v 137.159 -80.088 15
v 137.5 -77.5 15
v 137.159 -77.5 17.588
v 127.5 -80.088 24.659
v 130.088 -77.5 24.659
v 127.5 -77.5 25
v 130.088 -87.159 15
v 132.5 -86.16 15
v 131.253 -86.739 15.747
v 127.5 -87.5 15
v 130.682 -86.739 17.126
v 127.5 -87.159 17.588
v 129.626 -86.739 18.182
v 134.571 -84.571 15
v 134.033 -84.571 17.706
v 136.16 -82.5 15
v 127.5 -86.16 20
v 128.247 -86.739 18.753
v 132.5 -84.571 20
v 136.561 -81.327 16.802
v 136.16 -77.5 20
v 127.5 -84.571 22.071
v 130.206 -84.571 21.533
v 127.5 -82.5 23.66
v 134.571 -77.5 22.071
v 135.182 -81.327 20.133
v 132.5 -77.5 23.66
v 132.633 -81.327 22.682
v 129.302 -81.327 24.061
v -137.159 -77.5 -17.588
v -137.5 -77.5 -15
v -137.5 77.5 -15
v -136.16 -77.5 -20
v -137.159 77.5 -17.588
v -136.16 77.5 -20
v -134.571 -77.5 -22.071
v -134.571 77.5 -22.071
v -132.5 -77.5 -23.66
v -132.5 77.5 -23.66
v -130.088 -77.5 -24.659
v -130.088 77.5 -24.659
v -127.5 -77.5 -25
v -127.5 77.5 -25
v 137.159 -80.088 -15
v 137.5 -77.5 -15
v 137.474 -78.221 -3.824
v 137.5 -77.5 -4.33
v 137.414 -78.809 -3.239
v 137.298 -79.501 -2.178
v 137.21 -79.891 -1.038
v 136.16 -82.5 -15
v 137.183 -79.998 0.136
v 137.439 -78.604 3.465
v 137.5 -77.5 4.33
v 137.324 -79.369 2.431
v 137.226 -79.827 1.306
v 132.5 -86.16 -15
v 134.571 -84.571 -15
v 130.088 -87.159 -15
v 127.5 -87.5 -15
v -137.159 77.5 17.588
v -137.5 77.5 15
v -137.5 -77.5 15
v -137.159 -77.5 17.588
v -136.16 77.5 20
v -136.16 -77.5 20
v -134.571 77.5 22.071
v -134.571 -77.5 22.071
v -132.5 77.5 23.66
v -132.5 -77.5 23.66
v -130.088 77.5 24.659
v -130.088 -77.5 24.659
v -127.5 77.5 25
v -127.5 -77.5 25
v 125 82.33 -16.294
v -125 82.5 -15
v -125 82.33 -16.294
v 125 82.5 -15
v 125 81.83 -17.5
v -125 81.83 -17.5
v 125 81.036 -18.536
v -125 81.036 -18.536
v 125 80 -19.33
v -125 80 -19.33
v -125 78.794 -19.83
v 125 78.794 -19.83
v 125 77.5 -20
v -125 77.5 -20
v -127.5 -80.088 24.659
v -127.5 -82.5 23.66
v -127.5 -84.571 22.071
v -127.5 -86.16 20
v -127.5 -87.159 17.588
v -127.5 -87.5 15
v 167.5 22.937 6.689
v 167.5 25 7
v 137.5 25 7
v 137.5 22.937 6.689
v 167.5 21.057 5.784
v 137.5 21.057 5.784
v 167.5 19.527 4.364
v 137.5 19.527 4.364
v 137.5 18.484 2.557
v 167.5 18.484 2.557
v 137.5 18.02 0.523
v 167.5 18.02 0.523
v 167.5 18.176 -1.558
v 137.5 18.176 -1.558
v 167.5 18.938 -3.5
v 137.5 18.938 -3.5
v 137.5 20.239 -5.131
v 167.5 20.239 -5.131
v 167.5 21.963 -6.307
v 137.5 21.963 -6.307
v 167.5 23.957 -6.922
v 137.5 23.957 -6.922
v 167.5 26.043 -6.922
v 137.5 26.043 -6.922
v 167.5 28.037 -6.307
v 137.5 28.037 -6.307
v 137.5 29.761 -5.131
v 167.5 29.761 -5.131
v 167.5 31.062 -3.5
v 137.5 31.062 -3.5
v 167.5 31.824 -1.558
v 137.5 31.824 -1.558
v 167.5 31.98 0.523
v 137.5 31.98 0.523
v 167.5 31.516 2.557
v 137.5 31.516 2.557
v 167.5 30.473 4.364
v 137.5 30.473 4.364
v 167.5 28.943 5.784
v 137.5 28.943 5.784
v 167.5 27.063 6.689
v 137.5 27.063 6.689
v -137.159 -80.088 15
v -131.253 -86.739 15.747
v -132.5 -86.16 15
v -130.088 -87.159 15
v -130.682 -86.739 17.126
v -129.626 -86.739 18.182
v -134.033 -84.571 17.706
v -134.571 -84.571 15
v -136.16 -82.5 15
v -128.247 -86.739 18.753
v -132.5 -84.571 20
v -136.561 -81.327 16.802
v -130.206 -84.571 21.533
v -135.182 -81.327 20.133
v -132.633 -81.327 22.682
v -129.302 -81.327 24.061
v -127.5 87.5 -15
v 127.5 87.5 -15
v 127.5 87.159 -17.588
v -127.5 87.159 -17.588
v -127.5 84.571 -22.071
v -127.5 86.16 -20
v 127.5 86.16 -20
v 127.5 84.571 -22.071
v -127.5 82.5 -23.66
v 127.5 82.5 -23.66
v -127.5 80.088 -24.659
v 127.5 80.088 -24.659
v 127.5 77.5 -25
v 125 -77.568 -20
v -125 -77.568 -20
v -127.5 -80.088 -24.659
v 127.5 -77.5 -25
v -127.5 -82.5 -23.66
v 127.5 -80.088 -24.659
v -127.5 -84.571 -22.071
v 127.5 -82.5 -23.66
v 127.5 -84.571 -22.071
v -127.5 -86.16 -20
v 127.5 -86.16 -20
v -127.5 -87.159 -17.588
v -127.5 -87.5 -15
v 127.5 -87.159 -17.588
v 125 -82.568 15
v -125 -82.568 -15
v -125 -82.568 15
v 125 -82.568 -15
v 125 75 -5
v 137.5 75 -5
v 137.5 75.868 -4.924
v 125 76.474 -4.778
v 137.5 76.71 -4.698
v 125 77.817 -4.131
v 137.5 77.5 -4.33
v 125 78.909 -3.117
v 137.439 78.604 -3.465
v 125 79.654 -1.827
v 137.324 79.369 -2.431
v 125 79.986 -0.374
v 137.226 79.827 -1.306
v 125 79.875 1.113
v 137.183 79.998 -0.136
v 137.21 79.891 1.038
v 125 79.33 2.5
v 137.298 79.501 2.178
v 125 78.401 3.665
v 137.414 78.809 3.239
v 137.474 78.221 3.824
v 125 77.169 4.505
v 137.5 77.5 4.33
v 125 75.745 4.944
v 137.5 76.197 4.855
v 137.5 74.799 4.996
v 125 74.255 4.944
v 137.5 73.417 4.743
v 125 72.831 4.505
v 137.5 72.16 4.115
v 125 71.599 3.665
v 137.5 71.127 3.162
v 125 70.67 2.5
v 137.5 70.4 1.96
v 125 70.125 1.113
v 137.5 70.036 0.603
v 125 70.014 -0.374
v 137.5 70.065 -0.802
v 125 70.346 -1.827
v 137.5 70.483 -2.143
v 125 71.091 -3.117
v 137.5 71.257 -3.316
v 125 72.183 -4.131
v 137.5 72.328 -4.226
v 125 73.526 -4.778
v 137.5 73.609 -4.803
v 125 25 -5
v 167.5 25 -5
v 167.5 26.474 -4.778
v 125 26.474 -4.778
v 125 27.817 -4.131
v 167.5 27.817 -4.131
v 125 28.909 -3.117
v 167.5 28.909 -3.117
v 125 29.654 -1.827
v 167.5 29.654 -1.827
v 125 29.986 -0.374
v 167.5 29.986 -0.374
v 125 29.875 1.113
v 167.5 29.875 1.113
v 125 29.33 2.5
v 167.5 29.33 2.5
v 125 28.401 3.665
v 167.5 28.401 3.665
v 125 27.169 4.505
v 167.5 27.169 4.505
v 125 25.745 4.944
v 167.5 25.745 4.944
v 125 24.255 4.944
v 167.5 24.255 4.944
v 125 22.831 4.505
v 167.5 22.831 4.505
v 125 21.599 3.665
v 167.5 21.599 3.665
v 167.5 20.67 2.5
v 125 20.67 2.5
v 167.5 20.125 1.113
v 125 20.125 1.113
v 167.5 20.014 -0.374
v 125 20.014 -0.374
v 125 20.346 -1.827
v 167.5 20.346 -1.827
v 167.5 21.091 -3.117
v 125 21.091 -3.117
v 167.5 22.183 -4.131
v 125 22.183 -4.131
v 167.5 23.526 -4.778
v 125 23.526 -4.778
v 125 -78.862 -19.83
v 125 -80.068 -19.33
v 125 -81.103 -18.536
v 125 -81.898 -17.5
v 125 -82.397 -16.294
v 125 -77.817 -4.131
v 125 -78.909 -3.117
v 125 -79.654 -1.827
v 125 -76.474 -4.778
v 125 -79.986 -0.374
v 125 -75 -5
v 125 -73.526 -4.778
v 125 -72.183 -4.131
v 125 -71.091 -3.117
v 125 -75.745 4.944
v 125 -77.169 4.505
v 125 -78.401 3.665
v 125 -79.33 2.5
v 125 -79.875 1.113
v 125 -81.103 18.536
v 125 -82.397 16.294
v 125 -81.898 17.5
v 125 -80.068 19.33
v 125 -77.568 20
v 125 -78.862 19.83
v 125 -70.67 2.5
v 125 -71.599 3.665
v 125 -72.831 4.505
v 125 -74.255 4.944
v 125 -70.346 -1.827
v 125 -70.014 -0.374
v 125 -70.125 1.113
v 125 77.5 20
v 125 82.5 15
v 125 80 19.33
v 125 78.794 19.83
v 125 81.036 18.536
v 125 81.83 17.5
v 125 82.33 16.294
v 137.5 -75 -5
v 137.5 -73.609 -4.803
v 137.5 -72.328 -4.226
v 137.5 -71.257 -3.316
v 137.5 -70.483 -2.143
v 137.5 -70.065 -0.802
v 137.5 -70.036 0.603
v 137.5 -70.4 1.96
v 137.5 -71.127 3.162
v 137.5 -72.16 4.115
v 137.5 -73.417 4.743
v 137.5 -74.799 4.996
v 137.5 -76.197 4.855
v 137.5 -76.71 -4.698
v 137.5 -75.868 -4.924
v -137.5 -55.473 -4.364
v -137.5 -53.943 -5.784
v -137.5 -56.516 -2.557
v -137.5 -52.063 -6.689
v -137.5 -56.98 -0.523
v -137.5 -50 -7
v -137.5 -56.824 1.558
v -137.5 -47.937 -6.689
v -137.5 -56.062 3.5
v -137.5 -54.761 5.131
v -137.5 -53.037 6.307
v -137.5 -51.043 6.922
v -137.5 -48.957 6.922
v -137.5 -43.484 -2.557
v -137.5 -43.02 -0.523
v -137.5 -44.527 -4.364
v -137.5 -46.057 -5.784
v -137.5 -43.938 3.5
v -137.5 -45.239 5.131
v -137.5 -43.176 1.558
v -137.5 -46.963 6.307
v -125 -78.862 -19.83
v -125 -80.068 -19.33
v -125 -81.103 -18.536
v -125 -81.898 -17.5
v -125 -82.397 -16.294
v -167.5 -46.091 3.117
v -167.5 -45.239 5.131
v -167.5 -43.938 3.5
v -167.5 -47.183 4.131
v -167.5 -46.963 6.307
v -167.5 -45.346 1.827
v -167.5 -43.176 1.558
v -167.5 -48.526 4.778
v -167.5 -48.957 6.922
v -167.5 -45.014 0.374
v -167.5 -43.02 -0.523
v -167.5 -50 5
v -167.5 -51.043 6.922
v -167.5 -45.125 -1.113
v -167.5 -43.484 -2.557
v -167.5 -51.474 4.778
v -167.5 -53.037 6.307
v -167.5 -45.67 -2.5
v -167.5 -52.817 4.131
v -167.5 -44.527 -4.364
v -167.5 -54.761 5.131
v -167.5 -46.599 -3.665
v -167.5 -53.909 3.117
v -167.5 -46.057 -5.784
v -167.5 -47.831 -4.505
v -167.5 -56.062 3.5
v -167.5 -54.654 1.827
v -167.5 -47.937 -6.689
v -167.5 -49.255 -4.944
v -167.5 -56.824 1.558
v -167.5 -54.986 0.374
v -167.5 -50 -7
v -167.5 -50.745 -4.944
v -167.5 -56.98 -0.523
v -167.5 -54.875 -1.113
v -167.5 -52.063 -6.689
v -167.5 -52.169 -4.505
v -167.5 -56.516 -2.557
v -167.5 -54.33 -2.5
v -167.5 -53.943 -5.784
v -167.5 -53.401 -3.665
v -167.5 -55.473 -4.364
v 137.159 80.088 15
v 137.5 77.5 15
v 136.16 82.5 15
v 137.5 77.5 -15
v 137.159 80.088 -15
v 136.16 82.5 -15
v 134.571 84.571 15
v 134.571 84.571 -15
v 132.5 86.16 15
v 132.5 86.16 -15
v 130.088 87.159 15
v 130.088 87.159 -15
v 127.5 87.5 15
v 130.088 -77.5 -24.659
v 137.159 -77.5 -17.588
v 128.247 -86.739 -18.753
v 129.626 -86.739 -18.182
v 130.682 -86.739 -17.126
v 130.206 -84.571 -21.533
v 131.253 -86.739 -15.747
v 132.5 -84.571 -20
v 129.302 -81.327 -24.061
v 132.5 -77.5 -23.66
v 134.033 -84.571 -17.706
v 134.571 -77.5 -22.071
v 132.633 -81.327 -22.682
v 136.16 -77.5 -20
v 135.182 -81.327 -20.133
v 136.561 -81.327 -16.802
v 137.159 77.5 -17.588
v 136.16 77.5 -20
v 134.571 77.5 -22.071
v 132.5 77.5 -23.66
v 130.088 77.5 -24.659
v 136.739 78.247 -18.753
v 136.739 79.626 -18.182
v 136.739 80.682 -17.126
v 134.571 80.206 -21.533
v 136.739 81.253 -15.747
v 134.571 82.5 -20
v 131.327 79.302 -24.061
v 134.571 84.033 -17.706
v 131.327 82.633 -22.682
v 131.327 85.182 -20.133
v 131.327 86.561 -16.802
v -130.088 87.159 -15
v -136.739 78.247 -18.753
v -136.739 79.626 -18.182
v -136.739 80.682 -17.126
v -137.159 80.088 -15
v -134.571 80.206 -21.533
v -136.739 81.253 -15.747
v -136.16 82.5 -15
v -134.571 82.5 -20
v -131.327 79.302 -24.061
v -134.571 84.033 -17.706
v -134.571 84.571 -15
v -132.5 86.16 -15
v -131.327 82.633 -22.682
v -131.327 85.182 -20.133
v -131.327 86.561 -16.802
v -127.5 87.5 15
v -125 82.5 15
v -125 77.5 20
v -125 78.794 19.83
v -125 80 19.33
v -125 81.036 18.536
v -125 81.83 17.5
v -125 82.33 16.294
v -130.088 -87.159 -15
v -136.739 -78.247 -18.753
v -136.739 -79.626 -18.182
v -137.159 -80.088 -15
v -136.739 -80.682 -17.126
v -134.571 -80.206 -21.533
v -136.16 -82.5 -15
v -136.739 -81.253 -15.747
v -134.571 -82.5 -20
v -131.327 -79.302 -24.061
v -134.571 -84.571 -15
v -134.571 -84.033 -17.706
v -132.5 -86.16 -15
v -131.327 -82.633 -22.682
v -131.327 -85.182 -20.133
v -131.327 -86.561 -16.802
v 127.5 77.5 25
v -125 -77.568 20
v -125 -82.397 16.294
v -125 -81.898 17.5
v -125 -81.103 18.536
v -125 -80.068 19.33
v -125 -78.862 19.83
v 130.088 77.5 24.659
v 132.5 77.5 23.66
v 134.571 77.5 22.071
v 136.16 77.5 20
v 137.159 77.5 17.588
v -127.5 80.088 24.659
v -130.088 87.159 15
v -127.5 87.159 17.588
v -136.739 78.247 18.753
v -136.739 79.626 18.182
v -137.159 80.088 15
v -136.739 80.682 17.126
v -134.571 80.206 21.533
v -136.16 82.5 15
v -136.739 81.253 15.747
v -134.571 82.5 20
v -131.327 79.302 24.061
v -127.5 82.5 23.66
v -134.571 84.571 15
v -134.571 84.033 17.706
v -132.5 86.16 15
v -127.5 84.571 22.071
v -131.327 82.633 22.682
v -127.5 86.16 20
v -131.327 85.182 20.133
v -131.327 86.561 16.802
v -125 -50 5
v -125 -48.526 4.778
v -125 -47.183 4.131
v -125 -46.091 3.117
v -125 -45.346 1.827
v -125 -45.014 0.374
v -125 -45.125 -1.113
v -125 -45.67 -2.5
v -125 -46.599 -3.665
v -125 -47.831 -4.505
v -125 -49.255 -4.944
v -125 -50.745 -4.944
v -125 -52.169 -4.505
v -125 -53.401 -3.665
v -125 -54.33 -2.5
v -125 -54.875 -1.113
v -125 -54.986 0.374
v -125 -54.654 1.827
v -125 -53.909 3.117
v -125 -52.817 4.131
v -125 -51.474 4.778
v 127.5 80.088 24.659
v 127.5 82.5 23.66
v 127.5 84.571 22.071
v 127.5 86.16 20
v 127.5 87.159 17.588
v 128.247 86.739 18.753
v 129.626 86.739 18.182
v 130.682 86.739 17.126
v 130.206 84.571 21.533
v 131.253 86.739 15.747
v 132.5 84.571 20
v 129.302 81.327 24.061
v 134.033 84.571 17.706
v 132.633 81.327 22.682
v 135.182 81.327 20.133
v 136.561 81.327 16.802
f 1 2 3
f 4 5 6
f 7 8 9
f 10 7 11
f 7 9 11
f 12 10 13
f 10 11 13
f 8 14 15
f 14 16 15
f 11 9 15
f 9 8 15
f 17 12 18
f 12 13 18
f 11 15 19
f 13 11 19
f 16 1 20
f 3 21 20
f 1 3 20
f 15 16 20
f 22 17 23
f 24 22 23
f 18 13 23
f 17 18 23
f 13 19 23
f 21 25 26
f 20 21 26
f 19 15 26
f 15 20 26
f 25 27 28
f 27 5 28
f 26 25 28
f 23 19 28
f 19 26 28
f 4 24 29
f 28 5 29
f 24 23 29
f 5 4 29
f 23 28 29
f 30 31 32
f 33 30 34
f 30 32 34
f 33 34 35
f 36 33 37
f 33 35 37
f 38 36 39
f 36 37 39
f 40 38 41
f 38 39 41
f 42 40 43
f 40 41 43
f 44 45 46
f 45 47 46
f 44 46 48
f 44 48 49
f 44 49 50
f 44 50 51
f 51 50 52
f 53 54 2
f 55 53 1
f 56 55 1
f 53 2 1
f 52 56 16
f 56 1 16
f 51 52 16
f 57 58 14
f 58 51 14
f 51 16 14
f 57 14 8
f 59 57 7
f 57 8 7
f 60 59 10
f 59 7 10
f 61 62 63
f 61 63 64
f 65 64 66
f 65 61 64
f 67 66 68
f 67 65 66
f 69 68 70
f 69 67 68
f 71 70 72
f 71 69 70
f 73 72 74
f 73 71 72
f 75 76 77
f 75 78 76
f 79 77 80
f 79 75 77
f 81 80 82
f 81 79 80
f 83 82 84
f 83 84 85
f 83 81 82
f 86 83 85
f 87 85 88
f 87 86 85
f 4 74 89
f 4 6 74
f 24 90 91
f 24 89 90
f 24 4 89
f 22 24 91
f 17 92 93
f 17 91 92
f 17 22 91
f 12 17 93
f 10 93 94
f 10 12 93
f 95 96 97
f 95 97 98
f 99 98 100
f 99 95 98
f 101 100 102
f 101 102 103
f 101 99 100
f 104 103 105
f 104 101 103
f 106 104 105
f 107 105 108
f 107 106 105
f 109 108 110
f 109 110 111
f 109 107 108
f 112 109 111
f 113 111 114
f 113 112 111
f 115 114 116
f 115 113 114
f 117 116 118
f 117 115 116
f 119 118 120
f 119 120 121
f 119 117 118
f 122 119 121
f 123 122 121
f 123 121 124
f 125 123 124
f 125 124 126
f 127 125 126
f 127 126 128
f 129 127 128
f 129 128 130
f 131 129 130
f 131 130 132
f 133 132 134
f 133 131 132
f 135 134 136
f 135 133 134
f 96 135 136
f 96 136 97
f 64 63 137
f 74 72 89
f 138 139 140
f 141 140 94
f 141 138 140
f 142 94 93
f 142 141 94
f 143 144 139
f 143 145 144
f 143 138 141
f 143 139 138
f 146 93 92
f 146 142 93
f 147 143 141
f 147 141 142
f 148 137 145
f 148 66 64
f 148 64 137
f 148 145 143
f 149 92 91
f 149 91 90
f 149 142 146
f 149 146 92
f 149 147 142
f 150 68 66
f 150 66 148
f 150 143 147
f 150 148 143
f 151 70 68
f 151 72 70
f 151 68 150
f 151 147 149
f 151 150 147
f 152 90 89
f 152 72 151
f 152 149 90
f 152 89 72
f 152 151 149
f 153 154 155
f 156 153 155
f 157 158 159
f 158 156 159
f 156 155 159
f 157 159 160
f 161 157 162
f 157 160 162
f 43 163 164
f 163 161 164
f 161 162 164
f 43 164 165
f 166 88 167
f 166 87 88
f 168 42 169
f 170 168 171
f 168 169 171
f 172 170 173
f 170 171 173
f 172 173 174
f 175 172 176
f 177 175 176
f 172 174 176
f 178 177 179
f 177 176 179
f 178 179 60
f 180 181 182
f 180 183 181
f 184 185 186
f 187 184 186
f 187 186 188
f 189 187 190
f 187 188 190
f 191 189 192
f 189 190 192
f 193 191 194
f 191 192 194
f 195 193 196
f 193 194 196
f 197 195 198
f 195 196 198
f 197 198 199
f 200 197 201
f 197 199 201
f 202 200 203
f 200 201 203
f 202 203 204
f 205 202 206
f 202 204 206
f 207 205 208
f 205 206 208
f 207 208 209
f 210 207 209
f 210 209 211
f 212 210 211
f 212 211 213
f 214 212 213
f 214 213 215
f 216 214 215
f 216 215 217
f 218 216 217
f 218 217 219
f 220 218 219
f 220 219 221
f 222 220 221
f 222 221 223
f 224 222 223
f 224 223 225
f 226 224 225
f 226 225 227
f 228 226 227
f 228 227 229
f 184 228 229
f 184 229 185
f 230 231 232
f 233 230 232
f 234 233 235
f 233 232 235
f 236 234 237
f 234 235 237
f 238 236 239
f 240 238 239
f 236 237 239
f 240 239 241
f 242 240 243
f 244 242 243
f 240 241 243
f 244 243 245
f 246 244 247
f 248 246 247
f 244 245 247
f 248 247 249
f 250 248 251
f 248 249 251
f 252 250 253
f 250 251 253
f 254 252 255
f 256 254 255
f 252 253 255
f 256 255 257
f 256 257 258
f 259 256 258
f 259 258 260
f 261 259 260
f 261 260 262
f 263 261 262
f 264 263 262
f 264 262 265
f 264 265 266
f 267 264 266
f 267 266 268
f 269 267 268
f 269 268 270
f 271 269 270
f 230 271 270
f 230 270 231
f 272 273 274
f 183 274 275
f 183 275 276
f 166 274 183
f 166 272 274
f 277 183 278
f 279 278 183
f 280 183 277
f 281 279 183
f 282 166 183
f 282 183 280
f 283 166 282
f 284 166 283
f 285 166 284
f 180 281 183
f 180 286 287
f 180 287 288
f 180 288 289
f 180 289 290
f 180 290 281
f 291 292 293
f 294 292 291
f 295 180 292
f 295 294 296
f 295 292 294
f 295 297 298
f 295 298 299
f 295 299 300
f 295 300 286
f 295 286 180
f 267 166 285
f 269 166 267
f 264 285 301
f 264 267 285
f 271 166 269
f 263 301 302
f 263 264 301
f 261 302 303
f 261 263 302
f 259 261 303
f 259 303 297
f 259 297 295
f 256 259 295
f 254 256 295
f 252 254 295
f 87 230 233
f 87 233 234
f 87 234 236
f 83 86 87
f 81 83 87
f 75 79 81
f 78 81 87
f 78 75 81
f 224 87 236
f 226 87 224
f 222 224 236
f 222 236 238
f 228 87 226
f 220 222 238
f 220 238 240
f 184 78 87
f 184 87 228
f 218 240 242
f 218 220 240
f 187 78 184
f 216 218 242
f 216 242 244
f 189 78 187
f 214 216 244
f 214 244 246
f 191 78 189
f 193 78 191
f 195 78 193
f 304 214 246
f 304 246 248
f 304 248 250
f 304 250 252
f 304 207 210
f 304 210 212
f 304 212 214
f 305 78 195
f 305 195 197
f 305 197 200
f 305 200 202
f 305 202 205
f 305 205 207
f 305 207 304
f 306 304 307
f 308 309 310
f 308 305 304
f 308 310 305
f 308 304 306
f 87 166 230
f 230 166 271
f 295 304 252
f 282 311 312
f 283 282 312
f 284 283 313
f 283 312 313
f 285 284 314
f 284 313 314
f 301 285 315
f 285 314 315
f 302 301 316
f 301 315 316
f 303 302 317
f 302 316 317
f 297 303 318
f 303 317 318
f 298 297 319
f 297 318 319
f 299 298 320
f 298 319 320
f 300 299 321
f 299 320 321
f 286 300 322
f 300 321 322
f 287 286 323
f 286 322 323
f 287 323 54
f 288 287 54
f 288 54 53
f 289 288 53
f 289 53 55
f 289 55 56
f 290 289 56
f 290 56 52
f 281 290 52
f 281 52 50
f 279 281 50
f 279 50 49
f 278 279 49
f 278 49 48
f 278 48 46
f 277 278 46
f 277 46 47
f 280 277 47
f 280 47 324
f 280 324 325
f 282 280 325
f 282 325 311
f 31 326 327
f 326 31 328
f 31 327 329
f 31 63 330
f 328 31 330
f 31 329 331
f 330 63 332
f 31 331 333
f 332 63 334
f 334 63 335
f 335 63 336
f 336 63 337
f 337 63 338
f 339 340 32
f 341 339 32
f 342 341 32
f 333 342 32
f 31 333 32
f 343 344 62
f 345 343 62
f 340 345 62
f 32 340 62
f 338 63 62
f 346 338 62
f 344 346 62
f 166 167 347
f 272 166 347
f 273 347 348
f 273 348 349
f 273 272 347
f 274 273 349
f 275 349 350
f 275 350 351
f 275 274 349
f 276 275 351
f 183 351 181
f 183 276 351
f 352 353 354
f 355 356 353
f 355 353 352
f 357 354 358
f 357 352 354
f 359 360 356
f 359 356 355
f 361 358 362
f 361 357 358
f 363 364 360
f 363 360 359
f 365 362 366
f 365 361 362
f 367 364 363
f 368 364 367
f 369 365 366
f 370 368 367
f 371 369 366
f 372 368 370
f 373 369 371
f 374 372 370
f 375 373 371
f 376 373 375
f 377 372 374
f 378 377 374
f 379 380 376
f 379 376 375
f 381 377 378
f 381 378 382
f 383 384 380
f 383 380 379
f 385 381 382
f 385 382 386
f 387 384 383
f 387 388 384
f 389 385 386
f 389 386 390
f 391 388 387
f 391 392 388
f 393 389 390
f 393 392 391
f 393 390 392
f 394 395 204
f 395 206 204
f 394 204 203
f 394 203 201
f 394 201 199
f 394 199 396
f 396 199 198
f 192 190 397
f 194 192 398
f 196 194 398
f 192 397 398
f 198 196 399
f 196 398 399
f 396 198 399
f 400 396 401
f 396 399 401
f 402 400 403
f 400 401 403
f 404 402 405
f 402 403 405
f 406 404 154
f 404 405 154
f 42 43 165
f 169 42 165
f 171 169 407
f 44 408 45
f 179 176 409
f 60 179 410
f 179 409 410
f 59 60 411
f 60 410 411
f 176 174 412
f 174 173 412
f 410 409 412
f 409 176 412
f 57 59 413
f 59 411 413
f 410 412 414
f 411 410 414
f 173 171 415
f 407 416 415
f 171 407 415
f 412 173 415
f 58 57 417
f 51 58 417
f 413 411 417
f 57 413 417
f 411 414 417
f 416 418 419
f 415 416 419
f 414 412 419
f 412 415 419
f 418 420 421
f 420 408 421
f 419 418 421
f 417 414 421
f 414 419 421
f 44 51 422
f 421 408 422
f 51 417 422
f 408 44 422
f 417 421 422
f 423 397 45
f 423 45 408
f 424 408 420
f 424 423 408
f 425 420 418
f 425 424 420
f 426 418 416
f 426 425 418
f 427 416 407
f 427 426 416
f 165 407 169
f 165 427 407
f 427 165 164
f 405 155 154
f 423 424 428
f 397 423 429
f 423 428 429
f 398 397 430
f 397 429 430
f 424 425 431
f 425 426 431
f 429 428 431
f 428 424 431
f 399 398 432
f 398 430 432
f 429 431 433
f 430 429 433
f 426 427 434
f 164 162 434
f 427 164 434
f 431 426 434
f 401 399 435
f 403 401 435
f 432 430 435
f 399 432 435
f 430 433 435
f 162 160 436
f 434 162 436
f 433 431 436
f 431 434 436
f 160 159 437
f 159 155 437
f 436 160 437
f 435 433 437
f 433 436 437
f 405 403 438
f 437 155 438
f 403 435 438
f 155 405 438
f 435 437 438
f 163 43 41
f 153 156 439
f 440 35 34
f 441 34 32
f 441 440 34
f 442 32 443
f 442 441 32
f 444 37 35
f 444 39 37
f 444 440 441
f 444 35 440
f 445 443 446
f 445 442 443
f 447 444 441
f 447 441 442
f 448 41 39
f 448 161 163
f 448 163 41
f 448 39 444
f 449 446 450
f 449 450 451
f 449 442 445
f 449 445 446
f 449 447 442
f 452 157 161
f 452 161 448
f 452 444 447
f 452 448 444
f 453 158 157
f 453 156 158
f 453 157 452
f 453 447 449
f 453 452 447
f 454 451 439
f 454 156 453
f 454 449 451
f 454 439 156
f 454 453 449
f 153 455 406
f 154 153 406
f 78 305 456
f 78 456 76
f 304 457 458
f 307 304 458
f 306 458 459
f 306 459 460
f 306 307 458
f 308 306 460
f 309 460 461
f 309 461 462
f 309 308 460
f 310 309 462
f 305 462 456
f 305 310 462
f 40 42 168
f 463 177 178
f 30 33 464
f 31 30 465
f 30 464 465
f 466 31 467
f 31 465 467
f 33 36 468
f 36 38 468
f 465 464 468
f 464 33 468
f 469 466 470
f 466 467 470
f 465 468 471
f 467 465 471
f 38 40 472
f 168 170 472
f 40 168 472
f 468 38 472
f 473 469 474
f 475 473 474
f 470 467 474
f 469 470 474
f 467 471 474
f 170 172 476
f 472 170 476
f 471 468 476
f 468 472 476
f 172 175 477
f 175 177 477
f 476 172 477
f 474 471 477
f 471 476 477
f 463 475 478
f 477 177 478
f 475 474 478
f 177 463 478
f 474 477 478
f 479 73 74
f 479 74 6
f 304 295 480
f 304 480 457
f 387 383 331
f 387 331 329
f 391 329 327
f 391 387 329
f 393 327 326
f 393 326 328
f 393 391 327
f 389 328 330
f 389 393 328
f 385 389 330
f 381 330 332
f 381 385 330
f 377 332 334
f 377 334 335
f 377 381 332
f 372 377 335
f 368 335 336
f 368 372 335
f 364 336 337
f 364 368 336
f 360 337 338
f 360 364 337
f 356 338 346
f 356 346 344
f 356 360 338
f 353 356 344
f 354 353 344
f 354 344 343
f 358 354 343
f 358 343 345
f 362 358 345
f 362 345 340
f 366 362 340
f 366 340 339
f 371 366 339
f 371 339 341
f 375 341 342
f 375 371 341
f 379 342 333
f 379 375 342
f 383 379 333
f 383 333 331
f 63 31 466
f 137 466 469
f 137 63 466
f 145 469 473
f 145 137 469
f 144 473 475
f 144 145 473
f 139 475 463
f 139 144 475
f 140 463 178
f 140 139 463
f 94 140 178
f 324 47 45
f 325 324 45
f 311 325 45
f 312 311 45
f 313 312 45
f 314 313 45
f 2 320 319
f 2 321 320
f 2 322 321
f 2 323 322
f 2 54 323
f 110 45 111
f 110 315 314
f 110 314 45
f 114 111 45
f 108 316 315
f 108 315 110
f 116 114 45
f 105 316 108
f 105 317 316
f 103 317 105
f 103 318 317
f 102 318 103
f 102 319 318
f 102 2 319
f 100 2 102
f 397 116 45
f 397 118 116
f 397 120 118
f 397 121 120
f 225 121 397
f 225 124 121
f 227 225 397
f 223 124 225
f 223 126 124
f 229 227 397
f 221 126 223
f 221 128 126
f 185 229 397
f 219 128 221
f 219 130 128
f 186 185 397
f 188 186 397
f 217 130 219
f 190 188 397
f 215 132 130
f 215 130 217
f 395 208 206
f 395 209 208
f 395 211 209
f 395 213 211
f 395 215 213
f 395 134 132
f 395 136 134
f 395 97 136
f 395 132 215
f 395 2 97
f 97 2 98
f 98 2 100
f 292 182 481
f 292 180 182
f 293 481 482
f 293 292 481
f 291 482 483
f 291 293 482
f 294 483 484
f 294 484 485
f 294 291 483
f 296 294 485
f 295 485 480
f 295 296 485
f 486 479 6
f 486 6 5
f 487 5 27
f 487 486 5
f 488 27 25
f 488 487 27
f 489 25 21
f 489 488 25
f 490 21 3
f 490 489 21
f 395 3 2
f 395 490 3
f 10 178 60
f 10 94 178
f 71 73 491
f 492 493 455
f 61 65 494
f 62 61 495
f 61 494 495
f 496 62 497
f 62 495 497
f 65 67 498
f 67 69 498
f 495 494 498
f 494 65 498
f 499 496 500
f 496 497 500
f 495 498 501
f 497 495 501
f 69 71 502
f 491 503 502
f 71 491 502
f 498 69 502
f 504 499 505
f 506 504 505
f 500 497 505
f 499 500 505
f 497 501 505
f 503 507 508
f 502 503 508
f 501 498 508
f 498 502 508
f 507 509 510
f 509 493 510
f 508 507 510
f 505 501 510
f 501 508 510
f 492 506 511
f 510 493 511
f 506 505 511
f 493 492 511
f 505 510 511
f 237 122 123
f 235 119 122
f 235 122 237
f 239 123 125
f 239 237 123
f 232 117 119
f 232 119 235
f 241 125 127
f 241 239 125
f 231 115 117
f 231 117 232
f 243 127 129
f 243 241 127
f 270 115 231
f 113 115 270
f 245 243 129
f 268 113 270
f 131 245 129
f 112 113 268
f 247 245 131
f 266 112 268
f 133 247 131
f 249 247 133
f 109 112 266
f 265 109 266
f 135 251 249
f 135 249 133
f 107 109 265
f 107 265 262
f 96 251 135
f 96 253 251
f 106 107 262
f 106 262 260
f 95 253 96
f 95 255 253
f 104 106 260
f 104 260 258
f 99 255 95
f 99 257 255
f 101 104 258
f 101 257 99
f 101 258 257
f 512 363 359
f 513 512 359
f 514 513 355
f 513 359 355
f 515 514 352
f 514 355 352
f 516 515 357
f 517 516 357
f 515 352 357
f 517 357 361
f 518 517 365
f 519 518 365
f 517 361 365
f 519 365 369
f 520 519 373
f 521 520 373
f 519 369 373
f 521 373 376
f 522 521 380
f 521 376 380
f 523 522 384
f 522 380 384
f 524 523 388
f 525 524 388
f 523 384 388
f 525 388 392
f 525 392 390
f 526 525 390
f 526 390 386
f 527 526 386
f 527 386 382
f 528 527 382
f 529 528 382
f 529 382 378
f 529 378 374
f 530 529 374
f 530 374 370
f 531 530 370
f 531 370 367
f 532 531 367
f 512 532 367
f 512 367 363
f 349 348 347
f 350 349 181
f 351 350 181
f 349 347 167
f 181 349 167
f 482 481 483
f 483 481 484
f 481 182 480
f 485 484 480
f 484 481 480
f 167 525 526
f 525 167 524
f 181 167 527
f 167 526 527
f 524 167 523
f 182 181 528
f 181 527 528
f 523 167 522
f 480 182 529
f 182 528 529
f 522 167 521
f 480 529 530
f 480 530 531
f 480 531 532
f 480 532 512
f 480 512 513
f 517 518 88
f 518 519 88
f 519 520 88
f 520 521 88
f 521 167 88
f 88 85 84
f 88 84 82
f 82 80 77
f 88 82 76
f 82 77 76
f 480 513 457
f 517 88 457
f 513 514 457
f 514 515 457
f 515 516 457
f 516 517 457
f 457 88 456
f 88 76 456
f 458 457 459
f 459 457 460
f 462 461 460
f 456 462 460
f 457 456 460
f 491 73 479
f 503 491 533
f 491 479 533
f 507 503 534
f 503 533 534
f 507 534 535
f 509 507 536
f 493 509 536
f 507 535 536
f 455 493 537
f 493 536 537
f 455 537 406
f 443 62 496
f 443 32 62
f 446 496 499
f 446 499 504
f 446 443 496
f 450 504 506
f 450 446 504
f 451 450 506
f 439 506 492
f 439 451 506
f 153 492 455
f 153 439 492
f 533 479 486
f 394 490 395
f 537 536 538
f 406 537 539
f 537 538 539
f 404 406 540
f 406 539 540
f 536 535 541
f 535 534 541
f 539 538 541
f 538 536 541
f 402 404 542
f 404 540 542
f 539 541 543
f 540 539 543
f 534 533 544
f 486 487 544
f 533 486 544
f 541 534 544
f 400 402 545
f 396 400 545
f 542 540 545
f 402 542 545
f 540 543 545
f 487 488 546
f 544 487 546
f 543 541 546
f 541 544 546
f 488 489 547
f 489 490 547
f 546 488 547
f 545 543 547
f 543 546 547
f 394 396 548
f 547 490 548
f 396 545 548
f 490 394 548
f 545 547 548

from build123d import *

# Parameters (mm, degrees)
SKETCH1_W           = 275
SKETCH1_H           = 175
BOSS_EXTRUDE1_DEPTH = 25
FILLET1_R           = 10
SKETCH2_R           = 5
CUT_EXTRUDE1_DEPTH  = 180
CUT_EXTRUDE2_DEPTH  = 125
SKETCH5_R           = 5
CUT_EXTRUDE3_DEPTH  = 190
BOSS_EXTRUDE2_START = 30
SKETCH6_R           = 7
SKETCH6_R_2         = 5
BOSS_EXTRUDE2_DEPTH = 30
BOSS_EXTRUDE3_START = 30
SKETCH7_R           = 7
SKETCH7_R_2         = 5
BOSS_EXTRUDE3_DEPTH = 30


with BuildPart() as part:
    # Sketch1 → Boss-Extrude1 (new, symmetric)
    with BuildSketch(Plane.XY):
        Rectangle(SKETCH1_W, SKETCH1_H)
    extrude(amount=BOSS_EXTRUDE1_DEPTH, both=True)

    # Fillet1
    fillet1_edges = [part.edges().sort_by_distance(p)[0] for p in [
        (137.5, 0, 25),
        (0, 87.5, 25),
        (-137.5, 0, 25),
        (0, 87.5, -25),
        (137.5, 0, -25),
        (0, -87.5, -25),
        (-137.5, 0, -25),
        (-137.5, 87.5, 0),
        (137.5, 87.5, 0),
        (137.5, -87.5, 0),
        (-137.5, -87.5, 0),
        (0, -87.5, 25),
    ]]
    fillet(fillet1_edges, radius=FILLET1_R)

    # Sketch2 → Cut-Extrude1 (cut)
    with BuildSketch(Plane(origin=(137.5, 0, 0), x_dir=(0, 0, -1), z_dir=(1, 0, 0))):
        with Locations((0, 75)):
            Circle(SKETCH2_R)
        with Locations((0, 25)):
            Circle(SKETCH2_R)
        with Locations((0, -75)):
            Circle(SKETCH2_R)
    extrude(amount=-CUT_EXTRUDE1_DEPTH, mode=Mode.SUBTRACT)

    # Sketch3 → Cut-Extrude2 (cut, symmetric)
    with BuildSketch(Plane(origin=(0, 0, 0), x_dir=(0, 0, -1), z_dir=(1, 0, 0))):
        with BuildLine():
            Line((-15, 82.5), (15, 82.5))
            ThreePointArc((15, 82.5), (18.535533906, 81.035533906), (20, 77.5))
            Line((20, 77.5), (20, -77.567792301))
            ThreePointArc((20, -77.567792301), (18.535533906, -81.103326207), (15, -82.567792301))
            Line((15, -82.567792301), (-15, -82.567792301))
            ThreePointArc((-15, -82.567792301), (-18.535533906, -81.103326207), (-20, -77.567792301))
            Line((-20, -77.567792301), (-20, 77.5))
            ThreePointArc((-20, 77.5), (-18.535533906, 81.035533906), (-15, 82.5))
        make_face()
    extrude(amount=CUT_EXTRUDE2_DEPTH, both=True, mode=Mode.SUBTRACT)

    # Sketch5 → Cut-Extrude3 (cut)
    with BuildSketch(Plane.ZY.offset(137.5)):
        with Locations((0, -50)):
            Circle(SKETCH5_R)
    extrude(amount=-CUT_EXTRUDE3_DEPTH, mode=Mode.SUBTRACT)

    # Sketch6 → Boss-Extrude2 (add)
    with BuildSketch(Plane(origin=(137.5, 0, 0), x_dir=(0, 0, -1), z_dir=(1, 0, 0)).offset(BOSS_EXTRUDE2_START)):
        with Locations(Location((0, 25, 0), (0, 0, 180))):
            Circle(SKETCH6_R)
        with Locations((0, 25)):
            Circle(SKETCH6_R_2, mode=Mode.SUBTRACT)
    extrude(amount=-BOSS_EXTRUDE2_DEPTH)

    # Sketch7 → Boss-Extrude3 (add)
    with BuildSketch(Plane.ZY.offset(137.5).offset(BOSS_EXTRUDE3_START)):
        with Locations(Location((0, -50, 0), (0, 0, 180))):
            Circle(SKETCH7_R)
        with Locations((0, -50)):
            Circle(SKETCH7_R_2, mode=Mode.SUBTRACT)
    extrude(amount=-BOSS_EXTRUDE3_DEPTH)


solid = part.part
